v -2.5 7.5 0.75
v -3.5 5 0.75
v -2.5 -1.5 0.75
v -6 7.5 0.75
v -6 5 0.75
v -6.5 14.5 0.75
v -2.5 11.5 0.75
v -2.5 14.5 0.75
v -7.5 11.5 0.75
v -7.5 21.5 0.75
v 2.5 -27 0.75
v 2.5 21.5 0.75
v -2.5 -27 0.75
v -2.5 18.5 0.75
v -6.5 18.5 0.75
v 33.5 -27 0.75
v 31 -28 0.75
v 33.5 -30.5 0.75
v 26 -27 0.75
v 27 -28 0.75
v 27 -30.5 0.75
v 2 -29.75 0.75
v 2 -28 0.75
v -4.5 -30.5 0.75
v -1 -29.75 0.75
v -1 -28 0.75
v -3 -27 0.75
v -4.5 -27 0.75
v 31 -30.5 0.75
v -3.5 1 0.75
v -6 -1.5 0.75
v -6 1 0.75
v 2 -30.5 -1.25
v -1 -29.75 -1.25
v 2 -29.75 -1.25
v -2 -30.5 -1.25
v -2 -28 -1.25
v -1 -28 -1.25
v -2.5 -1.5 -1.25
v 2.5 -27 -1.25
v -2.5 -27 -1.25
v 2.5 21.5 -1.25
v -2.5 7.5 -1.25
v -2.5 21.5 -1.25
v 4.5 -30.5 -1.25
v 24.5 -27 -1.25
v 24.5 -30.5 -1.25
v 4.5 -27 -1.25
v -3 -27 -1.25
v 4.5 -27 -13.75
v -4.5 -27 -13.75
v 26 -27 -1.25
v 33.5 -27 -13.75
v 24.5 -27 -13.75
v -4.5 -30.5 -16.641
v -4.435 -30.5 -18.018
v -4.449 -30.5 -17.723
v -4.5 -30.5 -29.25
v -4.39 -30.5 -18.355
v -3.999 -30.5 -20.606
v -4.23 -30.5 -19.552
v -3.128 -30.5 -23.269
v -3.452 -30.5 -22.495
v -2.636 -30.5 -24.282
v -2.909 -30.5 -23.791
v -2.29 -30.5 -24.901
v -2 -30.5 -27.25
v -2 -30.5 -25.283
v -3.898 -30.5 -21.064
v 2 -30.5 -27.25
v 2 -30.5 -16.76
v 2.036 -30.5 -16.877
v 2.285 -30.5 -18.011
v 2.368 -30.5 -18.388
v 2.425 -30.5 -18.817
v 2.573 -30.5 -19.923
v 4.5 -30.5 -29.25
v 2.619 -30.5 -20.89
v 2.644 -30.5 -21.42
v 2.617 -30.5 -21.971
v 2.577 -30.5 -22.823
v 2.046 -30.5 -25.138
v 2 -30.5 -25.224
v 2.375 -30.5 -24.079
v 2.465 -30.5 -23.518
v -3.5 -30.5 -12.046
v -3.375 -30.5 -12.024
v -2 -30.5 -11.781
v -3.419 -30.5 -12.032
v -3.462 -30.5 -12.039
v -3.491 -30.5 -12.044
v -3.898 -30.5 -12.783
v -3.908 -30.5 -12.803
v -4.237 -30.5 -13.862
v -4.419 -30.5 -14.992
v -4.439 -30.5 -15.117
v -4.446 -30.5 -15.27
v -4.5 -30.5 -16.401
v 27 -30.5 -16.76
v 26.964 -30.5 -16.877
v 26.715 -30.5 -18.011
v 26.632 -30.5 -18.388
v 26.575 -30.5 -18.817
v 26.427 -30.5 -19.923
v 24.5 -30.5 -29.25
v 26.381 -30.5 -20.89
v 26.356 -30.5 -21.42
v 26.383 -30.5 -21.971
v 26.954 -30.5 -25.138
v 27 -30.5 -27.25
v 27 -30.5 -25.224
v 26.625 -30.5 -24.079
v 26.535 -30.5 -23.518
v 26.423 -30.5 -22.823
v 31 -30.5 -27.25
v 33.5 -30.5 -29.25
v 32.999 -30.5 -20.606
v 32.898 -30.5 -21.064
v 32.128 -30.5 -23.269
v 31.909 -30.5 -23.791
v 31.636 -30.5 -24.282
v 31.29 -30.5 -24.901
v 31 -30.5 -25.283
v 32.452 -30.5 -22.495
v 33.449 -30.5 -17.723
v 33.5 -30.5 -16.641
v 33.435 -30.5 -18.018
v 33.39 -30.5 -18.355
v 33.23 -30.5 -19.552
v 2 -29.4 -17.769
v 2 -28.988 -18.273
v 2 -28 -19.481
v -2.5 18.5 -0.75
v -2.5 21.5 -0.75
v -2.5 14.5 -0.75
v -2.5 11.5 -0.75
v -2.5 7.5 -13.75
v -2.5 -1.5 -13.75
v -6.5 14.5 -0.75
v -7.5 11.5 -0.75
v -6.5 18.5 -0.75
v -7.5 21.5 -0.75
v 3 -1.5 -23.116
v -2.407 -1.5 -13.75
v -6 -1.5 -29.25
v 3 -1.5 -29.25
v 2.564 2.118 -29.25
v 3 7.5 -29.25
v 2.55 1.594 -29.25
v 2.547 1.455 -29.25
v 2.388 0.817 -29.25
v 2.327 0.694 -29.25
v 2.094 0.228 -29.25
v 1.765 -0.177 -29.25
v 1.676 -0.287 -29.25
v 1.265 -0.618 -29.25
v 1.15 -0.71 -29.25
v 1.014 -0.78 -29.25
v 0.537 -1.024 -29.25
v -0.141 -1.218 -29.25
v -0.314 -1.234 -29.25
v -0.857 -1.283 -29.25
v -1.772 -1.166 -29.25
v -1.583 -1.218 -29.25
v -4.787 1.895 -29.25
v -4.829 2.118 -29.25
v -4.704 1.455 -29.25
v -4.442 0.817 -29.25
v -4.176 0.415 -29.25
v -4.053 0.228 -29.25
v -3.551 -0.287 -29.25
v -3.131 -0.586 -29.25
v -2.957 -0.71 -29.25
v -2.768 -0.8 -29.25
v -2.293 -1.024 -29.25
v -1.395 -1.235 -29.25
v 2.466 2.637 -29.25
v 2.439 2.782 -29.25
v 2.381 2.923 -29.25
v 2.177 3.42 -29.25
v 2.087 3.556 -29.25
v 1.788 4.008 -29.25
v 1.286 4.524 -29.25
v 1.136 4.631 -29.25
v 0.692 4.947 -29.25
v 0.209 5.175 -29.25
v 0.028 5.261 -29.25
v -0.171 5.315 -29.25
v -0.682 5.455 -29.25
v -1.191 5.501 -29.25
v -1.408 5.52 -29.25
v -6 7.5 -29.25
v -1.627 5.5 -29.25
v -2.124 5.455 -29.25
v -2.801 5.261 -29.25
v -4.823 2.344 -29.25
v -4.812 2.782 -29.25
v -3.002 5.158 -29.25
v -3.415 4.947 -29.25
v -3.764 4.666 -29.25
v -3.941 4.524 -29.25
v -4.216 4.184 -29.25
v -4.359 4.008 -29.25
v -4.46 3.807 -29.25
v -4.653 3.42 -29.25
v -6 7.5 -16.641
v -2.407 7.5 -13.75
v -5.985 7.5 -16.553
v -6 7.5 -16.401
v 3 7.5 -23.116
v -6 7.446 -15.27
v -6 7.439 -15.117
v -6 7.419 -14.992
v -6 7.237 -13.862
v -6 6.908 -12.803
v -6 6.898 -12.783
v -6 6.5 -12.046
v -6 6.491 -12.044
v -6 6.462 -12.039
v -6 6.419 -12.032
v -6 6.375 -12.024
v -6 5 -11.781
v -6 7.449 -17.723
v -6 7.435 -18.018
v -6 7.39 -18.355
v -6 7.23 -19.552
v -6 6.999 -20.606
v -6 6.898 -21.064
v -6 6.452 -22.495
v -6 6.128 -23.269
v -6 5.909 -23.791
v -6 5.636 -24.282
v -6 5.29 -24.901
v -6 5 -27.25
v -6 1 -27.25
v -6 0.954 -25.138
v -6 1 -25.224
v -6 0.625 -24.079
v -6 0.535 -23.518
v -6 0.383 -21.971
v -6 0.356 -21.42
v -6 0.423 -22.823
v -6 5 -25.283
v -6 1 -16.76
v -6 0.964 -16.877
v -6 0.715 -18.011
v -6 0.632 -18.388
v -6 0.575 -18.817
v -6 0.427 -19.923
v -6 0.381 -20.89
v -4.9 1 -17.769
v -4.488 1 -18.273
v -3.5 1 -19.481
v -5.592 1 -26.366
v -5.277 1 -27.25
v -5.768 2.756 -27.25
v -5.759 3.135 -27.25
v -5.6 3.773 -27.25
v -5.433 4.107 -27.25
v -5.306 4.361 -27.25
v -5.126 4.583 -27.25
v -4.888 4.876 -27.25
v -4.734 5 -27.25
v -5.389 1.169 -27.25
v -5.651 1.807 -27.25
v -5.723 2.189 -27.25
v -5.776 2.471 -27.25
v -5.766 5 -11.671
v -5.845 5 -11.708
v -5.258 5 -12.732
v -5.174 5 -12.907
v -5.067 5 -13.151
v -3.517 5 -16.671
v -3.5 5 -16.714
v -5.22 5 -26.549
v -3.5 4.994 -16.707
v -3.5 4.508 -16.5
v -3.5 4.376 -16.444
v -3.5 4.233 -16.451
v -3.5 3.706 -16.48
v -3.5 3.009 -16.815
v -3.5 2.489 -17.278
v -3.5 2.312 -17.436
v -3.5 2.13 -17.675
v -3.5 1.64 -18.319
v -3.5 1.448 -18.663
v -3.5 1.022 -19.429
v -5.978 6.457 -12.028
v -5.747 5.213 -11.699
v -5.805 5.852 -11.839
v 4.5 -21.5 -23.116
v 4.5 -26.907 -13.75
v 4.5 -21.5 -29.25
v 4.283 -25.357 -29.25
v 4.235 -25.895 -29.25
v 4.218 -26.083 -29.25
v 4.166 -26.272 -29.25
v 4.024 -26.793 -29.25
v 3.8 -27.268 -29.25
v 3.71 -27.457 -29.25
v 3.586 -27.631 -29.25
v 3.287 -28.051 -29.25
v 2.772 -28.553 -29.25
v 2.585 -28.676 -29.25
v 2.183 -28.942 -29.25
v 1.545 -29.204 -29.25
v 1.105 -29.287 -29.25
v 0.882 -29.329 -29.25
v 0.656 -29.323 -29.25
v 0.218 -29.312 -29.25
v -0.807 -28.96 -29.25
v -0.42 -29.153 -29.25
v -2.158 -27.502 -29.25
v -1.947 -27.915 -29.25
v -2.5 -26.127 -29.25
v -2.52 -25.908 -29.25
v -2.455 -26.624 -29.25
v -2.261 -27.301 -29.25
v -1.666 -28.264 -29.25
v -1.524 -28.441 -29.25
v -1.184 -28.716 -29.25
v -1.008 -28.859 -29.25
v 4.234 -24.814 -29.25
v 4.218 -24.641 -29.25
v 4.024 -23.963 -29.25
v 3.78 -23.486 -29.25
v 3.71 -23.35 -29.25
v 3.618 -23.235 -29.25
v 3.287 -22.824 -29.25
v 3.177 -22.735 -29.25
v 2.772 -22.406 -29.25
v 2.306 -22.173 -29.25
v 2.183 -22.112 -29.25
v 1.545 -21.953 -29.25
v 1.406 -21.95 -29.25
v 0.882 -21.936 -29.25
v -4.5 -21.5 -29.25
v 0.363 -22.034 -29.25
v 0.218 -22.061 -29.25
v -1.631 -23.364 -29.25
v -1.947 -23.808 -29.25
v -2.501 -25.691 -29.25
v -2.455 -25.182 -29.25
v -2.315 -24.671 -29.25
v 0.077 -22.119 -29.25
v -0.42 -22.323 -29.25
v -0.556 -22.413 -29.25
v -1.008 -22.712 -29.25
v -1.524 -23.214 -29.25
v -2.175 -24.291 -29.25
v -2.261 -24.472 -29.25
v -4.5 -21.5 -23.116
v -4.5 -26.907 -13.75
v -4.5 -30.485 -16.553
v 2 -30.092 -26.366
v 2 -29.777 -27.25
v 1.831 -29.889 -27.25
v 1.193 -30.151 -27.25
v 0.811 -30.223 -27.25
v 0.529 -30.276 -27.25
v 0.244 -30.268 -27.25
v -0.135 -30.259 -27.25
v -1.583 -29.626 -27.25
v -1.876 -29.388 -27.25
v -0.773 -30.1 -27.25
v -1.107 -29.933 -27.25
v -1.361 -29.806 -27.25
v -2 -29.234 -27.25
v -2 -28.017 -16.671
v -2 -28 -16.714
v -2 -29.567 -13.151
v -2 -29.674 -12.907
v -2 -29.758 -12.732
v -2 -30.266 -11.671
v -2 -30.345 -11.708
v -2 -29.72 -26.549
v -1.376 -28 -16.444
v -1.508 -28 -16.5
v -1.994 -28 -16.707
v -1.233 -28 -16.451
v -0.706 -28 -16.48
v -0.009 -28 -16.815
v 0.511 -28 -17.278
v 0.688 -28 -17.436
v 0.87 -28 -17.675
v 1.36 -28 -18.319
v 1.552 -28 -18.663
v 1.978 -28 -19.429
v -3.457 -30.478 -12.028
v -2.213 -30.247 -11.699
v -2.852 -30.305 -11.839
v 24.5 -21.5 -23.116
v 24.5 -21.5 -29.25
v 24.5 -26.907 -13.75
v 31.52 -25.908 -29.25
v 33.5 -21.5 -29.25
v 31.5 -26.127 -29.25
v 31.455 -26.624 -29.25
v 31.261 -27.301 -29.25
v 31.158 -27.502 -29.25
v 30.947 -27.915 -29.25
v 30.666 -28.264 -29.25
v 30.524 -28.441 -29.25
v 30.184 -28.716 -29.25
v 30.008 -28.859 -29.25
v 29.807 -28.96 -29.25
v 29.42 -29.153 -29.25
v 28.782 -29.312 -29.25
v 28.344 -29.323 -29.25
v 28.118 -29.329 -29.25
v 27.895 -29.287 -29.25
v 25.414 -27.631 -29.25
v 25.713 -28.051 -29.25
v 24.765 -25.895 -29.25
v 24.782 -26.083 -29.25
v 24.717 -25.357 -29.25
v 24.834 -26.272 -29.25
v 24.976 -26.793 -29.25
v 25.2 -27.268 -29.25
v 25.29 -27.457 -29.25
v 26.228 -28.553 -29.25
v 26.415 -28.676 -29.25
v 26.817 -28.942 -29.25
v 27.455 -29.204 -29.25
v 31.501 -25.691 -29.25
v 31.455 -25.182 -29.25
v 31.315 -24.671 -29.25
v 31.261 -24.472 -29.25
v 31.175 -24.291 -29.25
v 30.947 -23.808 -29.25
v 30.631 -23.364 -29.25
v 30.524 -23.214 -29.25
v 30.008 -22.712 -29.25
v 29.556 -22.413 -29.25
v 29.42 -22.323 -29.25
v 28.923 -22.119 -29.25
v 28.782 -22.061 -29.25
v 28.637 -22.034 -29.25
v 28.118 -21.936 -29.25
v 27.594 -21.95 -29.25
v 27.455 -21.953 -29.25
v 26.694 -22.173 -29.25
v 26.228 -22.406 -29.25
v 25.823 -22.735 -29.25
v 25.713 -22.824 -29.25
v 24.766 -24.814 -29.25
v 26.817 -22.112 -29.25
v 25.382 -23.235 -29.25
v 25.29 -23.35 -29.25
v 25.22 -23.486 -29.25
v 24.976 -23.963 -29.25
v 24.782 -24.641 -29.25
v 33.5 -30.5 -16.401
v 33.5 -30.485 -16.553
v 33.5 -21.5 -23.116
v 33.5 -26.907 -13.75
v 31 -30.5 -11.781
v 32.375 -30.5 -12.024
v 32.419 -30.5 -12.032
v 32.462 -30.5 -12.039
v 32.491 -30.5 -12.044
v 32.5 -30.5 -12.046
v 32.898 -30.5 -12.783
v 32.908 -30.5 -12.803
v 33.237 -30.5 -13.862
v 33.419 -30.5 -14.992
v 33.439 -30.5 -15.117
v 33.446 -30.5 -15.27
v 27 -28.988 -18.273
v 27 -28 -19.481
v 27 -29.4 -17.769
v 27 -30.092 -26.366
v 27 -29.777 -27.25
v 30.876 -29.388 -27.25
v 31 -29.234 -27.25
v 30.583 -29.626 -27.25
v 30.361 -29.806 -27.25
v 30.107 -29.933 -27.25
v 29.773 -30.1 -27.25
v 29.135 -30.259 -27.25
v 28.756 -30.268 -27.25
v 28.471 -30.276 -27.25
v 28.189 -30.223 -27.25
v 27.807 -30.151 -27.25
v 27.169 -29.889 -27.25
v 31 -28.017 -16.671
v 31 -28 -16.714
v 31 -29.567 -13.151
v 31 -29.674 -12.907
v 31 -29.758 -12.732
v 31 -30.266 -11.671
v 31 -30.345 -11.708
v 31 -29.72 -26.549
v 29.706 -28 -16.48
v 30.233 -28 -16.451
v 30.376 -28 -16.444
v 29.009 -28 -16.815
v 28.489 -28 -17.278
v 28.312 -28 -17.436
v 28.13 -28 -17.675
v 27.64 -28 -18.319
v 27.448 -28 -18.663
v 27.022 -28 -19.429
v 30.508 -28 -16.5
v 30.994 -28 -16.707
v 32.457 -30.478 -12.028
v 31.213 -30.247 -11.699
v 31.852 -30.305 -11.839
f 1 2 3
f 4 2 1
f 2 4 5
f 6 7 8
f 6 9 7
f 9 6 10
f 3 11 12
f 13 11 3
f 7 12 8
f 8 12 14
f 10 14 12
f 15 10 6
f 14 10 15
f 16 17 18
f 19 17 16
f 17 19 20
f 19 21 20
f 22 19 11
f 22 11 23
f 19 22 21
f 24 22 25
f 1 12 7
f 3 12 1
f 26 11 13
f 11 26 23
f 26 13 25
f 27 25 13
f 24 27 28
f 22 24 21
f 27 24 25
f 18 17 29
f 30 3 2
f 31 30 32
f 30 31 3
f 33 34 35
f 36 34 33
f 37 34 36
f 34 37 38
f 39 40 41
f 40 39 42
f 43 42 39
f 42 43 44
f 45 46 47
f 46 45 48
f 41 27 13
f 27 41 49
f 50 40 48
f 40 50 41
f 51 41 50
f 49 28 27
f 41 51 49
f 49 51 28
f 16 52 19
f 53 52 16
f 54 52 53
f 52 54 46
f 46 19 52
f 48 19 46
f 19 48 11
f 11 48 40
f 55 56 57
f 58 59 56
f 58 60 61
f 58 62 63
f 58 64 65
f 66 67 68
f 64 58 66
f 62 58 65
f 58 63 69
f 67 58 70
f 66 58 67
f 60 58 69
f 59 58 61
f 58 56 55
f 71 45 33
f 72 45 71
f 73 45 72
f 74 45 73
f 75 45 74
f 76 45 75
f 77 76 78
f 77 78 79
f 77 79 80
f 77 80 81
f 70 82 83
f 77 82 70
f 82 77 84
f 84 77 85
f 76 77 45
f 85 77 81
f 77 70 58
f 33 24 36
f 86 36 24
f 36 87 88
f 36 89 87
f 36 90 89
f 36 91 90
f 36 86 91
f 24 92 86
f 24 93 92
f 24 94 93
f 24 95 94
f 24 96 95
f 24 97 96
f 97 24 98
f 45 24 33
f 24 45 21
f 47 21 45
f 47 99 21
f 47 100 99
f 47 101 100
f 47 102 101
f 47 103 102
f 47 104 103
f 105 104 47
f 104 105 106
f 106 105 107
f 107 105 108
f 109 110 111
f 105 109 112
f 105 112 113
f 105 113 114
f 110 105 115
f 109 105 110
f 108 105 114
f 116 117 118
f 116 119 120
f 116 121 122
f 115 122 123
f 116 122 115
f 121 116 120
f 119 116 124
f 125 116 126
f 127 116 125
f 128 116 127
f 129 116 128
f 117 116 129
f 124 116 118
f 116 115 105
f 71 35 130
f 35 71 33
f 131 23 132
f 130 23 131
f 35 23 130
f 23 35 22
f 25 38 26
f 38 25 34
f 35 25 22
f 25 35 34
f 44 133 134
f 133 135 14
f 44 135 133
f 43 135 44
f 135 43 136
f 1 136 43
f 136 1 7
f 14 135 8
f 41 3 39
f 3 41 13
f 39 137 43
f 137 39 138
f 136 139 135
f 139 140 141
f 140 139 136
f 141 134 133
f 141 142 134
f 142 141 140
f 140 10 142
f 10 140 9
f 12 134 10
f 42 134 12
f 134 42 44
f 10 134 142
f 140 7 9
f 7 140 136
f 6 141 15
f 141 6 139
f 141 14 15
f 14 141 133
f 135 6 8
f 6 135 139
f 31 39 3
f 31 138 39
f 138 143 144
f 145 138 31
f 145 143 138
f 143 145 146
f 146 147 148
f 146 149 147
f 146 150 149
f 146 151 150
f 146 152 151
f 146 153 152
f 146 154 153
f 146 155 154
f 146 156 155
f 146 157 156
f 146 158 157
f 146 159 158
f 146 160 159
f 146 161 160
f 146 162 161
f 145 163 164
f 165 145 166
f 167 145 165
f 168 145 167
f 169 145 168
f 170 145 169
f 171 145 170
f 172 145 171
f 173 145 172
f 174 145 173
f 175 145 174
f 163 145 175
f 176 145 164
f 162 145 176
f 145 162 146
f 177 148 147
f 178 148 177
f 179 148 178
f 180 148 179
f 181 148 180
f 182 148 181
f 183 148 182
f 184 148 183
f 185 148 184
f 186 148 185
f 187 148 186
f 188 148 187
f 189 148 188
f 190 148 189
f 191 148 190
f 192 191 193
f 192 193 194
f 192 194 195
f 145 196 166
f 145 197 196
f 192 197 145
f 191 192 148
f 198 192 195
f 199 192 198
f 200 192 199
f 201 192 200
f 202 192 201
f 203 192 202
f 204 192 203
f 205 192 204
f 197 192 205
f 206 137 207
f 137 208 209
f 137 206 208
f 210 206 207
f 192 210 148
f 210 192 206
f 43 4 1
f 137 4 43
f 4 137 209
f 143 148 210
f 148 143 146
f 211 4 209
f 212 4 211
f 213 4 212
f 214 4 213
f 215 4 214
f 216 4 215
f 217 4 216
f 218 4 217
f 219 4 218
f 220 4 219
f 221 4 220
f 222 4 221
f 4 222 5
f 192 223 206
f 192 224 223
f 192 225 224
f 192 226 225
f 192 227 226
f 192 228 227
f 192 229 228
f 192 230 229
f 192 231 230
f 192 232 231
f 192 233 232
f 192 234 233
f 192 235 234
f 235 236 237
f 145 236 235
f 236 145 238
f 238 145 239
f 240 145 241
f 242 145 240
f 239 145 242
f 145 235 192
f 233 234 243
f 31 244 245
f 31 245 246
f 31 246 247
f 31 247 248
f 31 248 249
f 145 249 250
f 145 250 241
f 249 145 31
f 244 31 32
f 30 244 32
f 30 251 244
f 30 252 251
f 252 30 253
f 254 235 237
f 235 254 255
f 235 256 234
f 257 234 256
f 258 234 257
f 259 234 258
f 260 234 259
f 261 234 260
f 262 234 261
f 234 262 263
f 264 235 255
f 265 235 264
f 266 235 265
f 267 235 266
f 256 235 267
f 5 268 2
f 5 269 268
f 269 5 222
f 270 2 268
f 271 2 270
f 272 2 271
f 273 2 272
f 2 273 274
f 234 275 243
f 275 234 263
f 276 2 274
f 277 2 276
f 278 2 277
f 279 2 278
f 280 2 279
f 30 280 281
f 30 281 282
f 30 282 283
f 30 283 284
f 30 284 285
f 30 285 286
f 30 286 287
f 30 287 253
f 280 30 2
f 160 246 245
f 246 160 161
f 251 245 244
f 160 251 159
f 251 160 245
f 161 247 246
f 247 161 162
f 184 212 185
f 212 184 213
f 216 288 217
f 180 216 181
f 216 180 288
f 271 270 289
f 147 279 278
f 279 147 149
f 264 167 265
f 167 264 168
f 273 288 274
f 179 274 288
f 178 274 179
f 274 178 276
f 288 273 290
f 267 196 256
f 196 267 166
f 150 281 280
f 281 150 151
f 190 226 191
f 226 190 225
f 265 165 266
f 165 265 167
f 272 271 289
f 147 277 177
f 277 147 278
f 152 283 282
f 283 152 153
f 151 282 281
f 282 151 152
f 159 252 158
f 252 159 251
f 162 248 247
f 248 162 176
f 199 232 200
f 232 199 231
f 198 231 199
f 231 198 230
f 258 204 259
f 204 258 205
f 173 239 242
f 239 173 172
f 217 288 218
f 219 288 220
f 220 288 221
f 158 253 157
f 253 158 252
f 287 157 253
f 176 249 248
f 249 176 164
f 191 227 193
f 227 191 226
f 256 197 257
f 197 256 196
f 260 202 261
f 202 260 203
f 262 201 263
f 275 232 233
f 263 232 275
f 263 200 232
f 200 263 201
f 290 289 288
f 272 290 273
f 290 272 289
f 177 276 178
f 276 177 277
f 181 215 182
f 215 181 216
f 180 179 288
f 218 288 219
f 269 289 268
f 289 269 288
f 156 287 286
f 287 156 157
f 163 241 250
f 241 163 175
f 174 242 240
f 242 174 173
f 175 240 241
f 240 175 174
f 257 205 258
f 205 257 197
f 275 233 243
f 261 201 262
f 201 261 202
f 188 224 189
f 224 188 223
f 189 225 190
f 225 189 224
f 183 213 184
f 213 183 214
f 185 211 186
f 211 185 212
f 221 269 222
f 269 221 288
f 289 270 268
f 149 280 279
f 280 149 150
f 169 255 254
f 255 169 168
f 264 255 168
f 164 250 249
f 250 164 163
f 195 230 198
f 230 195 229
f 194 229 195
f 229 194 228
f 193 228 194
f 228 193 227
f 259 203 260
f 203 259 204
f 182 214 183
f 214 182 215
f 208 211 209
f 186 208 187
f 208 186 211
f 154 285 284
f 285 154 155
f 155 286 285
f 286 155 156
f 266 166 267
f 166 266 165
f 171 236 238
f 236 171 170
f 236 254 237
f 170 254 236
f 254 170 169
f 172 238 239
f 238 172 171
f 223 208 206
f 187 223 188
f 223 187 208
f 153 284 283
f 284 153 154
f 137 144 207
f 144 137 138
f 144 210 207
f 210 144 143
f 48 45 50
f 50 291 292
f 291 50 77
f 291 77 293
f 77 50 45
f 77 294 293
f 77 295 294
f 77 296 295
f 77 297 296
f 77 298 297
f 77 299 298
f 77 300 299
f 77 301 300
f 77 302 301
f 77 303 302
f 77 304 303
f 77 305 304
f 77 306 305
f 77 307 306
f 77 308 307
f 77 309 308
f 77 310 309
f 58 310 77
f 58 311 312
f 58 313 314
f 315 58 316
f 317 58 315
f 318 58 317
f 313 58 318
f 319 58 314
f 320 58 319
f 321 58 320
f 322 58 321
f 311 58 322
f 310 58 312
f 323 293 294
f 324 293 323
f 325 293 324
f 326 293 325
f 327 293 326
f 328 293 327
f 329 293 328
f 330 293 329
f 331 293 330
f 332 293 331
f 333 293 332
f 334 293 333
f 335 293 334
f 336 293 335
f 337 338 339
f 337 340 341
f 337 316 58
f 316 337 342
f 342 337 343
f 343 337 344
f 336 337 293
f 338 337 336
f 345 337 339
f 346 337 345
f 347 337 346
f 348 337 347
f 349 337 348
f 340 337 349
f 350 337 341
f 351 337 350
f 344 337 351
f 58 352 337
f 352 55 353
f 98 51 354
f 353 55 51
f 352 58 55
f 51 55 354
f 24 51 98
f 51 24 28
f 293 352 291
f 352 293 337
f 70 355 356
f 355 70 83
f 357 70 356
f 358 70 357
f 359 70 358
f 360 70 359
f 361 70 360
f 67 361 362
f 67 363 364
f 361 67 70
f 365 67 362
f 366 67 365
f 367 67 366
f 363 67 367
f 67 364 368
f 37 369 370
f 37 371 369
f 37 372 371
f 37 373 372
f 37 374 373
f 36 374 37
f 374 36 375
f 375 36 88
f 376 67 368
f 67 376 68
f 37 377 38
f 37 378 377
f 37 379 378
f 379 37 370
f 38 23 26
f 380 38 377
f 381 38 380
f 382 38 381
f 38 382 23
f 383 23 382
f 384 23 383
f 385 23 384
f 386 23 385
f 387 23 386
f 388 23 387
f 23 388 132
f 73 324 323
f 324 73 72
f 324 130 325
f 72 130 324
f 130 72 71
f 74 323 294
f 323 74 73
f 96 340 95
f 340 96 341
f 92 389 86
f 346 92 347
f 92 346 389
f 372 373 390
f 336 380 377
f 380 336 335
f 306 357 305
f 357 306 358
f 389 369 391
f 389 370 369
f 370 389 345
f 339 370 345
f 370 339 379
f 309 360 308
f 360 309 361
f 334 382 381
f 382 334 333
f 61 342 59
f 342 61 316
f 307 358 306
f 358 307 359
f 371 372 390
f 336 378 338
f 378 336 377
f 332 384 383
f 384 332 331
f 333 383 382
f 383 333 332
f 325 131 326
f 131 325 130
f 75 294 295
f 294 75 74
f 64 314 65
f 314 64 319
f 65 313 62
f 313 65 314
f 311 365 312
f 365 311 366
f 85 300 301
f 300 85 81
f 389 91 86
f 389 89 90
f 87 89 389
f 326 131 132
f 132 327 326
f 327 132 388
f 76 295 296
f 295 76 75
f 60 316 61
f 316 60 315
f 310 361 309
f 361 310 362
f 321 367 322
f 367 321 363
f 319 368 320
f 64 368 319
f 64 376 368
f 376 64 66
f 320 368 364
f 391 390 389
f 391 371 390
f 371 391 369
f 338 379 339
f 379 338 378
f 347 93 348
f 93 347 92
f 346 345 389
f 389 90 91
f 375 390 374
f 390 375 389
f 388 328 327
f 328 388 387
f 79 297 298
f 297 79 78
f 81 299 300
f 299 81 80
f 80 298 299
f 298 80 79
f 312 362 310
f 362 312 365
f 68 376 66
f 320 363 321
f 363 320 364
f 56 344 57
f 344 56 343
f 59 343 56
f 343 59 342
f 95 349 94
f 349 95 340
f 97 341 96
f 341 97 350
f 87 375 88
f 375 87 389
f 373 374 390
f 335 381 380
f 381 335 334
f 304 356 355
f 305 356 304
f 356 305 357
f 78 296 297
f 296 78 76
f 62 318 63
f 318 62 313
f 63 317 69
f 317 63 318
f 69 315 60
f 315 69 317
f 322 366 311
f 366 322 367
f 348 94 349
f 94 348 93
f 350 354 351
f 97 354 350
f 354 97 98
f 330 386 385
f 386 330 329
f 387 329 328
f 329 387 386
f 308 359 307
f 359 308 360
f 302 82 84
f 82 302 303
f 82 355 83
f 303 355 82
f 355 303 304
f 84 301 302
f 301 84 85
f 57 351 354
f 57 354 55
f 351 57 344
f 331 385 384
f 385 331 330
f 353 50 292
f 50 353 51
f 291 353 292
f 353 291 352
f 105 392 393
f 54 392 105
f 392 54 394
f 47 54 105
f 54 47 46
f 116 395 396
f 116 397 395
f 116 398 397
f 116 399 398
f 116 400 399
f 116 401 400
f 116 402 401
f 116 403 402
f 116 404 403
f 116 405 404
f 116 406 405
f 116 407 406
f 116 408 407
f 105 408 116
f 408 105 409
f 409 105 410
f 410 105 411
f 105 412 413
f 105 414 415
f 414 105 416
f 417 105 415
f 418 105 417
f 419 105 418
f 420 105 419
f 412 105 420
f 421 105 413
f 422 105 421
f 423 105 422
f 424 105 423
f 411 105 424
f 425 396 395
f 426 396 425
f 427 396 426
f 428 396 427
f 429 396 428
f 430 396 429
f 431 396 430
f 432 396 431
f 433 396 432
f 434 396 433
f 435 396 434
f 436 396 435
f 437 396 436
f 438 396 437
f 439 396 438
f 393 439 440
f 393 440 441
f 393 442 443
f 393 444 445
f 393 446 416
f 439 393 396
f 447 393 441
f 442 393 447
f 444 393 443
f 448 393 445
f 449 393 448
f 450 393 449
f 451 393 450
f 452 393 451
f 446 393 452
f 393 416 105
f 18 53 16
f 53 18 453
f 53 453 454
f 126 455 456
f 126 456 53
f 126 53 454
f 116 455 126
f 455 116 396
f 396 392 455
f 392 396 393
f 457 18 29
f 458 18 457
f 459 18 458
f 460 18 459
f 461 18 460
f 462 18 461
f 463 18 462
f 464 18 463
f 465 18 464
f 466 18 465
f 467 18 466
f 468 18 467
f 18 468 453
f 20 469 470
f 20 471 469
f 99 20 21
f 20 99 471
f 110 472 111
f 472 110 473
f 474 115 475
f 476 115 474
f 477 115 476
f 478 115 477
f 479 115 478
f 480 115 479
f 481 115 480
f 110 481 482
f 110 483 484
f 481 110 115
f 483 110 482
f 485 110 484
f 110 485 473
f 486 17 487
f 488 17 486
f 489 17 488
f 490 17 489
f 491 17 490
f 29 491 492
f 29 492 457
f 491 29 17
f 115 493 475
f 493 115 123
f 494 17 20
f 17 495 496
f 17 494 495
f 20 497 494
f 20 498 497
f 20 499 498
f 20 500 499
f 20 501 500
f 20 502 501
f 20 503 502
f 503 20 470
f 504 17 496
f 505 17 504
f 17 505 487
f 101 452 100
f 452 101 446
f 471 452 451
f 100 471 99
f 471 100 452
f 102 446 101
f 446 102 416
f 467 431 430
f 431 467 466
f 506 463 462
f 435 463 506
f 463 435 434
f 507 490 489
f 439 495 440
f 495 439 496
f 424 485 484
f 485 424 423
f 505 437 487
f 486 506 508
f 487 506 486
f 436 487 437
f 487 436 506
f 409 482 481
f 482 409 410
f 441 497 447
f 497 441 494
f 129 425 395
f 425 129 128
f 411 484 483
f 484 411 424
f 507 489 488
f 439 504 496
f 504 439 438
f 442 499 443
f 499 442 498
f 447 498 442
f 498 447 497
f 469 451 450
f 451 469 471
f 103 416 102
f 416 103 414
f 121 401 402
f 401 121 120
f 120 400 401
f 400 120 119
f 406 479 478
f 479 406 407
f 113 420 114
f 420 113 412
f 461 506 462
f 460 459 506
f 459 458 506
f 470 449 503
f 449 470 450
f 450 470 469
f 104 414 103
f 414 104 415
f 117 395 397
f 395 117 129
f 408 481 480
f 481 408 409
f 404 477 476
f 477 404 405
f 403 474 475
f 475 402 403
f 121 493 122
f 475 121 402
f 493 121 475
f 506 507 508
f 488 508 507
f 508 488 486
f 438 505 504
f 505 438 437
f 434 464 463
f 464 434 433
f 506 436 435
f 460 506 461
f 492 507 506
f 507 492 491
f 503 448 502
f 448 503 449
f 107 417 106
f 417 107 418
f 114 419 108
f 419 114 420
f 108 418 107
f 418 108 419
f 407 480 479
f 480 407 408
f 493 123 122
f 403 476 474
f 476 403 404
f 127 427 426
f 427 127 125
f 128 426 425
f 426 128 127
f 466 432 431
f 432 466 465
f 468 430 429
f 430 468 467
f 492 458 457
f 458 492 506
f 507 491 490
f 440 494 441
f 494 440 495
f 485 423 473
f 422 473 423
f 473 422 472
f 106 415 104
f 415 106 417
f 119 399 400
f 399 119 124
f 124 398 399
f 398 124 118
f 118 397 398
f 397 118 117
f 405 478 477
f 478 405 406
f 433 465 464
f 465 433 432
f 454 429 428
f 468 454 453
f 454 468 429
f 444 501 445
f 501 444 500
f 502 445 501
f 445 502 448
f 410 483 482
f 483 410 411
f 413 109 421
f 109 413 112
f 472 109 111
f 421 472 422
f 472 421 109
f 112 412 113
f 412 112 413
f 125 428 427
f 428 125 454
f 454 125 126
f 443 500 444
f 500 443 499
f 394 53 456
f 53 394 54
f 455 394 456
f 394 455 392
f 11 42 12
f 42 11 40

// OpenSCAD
/** JoseA. 2014-09-28
	 PrintrBot Simple, simple base for LEDs.

	No warraties. Use at your own risk.
*/

// support
translate([0,-3,-0.25])
cube ( [ 5, 49, 2] , center=true );

// support 
translate([11.5,-28.75,-0.25])
difference(){
	cube ( [ 29, 3.5, 2] , center = true);
	translate ( [-11,0,0])
	cube ( [3,2,2], center = true);
}


// handle for wrapping with cables
translate ( [-5,16.5,0])
difference (){
	cube ( [5, 10, 1.5 ], center = true);
	translate ([.5,0,0])
	cube ( [4, 4, 1.5 ], center = true);
};


translate ( [-1.5, 3,-14.25])
rotate ( [0,0,270])
leg();

translate ( [0, -26,-14.25])
leg();

translate ( [29, -26,-14.25])
mirror([1,0,0])
leg(); 

module leg()
{
	difference (){
		cube ( [ 9, 9, 30], center = true);

		translate ( [0,-4,1])
		cube ([4,4,28],center= true);

		translate ( [0,-2,-10])
		rotate ([25,-10,])
		// probé con radio 5 y no entra. Podría ser 6.5
		// 7 sirvió pero se salía
		cylinder ( h = 25, d= 6.7, $fn = 32, center = true);
		/*translate ( [0,-1,5])
		cube ( [ 6, 4, 20], center = true);*/

		translate ( [0,3,8.5])
		cube ( [9,8,16], center = true);
		
		translate ( [0,4,-3])
		rotate ( [30,0,0] )
		cube ( [9,5,11], center = true);
	}
}


/*
translate ( [0, -26,-14.25])
{
difference (){
cube ( [ 9, 9, 30], center = true);

translate ( [0,-2,-10])
rotate ([25,-10,0])
cylinder ( h = 25, d= 7, $fn = 32, center = true);

translate ( [0,0,5])
cube ( [ 6, 6, 20], center = true);
}

}*/
